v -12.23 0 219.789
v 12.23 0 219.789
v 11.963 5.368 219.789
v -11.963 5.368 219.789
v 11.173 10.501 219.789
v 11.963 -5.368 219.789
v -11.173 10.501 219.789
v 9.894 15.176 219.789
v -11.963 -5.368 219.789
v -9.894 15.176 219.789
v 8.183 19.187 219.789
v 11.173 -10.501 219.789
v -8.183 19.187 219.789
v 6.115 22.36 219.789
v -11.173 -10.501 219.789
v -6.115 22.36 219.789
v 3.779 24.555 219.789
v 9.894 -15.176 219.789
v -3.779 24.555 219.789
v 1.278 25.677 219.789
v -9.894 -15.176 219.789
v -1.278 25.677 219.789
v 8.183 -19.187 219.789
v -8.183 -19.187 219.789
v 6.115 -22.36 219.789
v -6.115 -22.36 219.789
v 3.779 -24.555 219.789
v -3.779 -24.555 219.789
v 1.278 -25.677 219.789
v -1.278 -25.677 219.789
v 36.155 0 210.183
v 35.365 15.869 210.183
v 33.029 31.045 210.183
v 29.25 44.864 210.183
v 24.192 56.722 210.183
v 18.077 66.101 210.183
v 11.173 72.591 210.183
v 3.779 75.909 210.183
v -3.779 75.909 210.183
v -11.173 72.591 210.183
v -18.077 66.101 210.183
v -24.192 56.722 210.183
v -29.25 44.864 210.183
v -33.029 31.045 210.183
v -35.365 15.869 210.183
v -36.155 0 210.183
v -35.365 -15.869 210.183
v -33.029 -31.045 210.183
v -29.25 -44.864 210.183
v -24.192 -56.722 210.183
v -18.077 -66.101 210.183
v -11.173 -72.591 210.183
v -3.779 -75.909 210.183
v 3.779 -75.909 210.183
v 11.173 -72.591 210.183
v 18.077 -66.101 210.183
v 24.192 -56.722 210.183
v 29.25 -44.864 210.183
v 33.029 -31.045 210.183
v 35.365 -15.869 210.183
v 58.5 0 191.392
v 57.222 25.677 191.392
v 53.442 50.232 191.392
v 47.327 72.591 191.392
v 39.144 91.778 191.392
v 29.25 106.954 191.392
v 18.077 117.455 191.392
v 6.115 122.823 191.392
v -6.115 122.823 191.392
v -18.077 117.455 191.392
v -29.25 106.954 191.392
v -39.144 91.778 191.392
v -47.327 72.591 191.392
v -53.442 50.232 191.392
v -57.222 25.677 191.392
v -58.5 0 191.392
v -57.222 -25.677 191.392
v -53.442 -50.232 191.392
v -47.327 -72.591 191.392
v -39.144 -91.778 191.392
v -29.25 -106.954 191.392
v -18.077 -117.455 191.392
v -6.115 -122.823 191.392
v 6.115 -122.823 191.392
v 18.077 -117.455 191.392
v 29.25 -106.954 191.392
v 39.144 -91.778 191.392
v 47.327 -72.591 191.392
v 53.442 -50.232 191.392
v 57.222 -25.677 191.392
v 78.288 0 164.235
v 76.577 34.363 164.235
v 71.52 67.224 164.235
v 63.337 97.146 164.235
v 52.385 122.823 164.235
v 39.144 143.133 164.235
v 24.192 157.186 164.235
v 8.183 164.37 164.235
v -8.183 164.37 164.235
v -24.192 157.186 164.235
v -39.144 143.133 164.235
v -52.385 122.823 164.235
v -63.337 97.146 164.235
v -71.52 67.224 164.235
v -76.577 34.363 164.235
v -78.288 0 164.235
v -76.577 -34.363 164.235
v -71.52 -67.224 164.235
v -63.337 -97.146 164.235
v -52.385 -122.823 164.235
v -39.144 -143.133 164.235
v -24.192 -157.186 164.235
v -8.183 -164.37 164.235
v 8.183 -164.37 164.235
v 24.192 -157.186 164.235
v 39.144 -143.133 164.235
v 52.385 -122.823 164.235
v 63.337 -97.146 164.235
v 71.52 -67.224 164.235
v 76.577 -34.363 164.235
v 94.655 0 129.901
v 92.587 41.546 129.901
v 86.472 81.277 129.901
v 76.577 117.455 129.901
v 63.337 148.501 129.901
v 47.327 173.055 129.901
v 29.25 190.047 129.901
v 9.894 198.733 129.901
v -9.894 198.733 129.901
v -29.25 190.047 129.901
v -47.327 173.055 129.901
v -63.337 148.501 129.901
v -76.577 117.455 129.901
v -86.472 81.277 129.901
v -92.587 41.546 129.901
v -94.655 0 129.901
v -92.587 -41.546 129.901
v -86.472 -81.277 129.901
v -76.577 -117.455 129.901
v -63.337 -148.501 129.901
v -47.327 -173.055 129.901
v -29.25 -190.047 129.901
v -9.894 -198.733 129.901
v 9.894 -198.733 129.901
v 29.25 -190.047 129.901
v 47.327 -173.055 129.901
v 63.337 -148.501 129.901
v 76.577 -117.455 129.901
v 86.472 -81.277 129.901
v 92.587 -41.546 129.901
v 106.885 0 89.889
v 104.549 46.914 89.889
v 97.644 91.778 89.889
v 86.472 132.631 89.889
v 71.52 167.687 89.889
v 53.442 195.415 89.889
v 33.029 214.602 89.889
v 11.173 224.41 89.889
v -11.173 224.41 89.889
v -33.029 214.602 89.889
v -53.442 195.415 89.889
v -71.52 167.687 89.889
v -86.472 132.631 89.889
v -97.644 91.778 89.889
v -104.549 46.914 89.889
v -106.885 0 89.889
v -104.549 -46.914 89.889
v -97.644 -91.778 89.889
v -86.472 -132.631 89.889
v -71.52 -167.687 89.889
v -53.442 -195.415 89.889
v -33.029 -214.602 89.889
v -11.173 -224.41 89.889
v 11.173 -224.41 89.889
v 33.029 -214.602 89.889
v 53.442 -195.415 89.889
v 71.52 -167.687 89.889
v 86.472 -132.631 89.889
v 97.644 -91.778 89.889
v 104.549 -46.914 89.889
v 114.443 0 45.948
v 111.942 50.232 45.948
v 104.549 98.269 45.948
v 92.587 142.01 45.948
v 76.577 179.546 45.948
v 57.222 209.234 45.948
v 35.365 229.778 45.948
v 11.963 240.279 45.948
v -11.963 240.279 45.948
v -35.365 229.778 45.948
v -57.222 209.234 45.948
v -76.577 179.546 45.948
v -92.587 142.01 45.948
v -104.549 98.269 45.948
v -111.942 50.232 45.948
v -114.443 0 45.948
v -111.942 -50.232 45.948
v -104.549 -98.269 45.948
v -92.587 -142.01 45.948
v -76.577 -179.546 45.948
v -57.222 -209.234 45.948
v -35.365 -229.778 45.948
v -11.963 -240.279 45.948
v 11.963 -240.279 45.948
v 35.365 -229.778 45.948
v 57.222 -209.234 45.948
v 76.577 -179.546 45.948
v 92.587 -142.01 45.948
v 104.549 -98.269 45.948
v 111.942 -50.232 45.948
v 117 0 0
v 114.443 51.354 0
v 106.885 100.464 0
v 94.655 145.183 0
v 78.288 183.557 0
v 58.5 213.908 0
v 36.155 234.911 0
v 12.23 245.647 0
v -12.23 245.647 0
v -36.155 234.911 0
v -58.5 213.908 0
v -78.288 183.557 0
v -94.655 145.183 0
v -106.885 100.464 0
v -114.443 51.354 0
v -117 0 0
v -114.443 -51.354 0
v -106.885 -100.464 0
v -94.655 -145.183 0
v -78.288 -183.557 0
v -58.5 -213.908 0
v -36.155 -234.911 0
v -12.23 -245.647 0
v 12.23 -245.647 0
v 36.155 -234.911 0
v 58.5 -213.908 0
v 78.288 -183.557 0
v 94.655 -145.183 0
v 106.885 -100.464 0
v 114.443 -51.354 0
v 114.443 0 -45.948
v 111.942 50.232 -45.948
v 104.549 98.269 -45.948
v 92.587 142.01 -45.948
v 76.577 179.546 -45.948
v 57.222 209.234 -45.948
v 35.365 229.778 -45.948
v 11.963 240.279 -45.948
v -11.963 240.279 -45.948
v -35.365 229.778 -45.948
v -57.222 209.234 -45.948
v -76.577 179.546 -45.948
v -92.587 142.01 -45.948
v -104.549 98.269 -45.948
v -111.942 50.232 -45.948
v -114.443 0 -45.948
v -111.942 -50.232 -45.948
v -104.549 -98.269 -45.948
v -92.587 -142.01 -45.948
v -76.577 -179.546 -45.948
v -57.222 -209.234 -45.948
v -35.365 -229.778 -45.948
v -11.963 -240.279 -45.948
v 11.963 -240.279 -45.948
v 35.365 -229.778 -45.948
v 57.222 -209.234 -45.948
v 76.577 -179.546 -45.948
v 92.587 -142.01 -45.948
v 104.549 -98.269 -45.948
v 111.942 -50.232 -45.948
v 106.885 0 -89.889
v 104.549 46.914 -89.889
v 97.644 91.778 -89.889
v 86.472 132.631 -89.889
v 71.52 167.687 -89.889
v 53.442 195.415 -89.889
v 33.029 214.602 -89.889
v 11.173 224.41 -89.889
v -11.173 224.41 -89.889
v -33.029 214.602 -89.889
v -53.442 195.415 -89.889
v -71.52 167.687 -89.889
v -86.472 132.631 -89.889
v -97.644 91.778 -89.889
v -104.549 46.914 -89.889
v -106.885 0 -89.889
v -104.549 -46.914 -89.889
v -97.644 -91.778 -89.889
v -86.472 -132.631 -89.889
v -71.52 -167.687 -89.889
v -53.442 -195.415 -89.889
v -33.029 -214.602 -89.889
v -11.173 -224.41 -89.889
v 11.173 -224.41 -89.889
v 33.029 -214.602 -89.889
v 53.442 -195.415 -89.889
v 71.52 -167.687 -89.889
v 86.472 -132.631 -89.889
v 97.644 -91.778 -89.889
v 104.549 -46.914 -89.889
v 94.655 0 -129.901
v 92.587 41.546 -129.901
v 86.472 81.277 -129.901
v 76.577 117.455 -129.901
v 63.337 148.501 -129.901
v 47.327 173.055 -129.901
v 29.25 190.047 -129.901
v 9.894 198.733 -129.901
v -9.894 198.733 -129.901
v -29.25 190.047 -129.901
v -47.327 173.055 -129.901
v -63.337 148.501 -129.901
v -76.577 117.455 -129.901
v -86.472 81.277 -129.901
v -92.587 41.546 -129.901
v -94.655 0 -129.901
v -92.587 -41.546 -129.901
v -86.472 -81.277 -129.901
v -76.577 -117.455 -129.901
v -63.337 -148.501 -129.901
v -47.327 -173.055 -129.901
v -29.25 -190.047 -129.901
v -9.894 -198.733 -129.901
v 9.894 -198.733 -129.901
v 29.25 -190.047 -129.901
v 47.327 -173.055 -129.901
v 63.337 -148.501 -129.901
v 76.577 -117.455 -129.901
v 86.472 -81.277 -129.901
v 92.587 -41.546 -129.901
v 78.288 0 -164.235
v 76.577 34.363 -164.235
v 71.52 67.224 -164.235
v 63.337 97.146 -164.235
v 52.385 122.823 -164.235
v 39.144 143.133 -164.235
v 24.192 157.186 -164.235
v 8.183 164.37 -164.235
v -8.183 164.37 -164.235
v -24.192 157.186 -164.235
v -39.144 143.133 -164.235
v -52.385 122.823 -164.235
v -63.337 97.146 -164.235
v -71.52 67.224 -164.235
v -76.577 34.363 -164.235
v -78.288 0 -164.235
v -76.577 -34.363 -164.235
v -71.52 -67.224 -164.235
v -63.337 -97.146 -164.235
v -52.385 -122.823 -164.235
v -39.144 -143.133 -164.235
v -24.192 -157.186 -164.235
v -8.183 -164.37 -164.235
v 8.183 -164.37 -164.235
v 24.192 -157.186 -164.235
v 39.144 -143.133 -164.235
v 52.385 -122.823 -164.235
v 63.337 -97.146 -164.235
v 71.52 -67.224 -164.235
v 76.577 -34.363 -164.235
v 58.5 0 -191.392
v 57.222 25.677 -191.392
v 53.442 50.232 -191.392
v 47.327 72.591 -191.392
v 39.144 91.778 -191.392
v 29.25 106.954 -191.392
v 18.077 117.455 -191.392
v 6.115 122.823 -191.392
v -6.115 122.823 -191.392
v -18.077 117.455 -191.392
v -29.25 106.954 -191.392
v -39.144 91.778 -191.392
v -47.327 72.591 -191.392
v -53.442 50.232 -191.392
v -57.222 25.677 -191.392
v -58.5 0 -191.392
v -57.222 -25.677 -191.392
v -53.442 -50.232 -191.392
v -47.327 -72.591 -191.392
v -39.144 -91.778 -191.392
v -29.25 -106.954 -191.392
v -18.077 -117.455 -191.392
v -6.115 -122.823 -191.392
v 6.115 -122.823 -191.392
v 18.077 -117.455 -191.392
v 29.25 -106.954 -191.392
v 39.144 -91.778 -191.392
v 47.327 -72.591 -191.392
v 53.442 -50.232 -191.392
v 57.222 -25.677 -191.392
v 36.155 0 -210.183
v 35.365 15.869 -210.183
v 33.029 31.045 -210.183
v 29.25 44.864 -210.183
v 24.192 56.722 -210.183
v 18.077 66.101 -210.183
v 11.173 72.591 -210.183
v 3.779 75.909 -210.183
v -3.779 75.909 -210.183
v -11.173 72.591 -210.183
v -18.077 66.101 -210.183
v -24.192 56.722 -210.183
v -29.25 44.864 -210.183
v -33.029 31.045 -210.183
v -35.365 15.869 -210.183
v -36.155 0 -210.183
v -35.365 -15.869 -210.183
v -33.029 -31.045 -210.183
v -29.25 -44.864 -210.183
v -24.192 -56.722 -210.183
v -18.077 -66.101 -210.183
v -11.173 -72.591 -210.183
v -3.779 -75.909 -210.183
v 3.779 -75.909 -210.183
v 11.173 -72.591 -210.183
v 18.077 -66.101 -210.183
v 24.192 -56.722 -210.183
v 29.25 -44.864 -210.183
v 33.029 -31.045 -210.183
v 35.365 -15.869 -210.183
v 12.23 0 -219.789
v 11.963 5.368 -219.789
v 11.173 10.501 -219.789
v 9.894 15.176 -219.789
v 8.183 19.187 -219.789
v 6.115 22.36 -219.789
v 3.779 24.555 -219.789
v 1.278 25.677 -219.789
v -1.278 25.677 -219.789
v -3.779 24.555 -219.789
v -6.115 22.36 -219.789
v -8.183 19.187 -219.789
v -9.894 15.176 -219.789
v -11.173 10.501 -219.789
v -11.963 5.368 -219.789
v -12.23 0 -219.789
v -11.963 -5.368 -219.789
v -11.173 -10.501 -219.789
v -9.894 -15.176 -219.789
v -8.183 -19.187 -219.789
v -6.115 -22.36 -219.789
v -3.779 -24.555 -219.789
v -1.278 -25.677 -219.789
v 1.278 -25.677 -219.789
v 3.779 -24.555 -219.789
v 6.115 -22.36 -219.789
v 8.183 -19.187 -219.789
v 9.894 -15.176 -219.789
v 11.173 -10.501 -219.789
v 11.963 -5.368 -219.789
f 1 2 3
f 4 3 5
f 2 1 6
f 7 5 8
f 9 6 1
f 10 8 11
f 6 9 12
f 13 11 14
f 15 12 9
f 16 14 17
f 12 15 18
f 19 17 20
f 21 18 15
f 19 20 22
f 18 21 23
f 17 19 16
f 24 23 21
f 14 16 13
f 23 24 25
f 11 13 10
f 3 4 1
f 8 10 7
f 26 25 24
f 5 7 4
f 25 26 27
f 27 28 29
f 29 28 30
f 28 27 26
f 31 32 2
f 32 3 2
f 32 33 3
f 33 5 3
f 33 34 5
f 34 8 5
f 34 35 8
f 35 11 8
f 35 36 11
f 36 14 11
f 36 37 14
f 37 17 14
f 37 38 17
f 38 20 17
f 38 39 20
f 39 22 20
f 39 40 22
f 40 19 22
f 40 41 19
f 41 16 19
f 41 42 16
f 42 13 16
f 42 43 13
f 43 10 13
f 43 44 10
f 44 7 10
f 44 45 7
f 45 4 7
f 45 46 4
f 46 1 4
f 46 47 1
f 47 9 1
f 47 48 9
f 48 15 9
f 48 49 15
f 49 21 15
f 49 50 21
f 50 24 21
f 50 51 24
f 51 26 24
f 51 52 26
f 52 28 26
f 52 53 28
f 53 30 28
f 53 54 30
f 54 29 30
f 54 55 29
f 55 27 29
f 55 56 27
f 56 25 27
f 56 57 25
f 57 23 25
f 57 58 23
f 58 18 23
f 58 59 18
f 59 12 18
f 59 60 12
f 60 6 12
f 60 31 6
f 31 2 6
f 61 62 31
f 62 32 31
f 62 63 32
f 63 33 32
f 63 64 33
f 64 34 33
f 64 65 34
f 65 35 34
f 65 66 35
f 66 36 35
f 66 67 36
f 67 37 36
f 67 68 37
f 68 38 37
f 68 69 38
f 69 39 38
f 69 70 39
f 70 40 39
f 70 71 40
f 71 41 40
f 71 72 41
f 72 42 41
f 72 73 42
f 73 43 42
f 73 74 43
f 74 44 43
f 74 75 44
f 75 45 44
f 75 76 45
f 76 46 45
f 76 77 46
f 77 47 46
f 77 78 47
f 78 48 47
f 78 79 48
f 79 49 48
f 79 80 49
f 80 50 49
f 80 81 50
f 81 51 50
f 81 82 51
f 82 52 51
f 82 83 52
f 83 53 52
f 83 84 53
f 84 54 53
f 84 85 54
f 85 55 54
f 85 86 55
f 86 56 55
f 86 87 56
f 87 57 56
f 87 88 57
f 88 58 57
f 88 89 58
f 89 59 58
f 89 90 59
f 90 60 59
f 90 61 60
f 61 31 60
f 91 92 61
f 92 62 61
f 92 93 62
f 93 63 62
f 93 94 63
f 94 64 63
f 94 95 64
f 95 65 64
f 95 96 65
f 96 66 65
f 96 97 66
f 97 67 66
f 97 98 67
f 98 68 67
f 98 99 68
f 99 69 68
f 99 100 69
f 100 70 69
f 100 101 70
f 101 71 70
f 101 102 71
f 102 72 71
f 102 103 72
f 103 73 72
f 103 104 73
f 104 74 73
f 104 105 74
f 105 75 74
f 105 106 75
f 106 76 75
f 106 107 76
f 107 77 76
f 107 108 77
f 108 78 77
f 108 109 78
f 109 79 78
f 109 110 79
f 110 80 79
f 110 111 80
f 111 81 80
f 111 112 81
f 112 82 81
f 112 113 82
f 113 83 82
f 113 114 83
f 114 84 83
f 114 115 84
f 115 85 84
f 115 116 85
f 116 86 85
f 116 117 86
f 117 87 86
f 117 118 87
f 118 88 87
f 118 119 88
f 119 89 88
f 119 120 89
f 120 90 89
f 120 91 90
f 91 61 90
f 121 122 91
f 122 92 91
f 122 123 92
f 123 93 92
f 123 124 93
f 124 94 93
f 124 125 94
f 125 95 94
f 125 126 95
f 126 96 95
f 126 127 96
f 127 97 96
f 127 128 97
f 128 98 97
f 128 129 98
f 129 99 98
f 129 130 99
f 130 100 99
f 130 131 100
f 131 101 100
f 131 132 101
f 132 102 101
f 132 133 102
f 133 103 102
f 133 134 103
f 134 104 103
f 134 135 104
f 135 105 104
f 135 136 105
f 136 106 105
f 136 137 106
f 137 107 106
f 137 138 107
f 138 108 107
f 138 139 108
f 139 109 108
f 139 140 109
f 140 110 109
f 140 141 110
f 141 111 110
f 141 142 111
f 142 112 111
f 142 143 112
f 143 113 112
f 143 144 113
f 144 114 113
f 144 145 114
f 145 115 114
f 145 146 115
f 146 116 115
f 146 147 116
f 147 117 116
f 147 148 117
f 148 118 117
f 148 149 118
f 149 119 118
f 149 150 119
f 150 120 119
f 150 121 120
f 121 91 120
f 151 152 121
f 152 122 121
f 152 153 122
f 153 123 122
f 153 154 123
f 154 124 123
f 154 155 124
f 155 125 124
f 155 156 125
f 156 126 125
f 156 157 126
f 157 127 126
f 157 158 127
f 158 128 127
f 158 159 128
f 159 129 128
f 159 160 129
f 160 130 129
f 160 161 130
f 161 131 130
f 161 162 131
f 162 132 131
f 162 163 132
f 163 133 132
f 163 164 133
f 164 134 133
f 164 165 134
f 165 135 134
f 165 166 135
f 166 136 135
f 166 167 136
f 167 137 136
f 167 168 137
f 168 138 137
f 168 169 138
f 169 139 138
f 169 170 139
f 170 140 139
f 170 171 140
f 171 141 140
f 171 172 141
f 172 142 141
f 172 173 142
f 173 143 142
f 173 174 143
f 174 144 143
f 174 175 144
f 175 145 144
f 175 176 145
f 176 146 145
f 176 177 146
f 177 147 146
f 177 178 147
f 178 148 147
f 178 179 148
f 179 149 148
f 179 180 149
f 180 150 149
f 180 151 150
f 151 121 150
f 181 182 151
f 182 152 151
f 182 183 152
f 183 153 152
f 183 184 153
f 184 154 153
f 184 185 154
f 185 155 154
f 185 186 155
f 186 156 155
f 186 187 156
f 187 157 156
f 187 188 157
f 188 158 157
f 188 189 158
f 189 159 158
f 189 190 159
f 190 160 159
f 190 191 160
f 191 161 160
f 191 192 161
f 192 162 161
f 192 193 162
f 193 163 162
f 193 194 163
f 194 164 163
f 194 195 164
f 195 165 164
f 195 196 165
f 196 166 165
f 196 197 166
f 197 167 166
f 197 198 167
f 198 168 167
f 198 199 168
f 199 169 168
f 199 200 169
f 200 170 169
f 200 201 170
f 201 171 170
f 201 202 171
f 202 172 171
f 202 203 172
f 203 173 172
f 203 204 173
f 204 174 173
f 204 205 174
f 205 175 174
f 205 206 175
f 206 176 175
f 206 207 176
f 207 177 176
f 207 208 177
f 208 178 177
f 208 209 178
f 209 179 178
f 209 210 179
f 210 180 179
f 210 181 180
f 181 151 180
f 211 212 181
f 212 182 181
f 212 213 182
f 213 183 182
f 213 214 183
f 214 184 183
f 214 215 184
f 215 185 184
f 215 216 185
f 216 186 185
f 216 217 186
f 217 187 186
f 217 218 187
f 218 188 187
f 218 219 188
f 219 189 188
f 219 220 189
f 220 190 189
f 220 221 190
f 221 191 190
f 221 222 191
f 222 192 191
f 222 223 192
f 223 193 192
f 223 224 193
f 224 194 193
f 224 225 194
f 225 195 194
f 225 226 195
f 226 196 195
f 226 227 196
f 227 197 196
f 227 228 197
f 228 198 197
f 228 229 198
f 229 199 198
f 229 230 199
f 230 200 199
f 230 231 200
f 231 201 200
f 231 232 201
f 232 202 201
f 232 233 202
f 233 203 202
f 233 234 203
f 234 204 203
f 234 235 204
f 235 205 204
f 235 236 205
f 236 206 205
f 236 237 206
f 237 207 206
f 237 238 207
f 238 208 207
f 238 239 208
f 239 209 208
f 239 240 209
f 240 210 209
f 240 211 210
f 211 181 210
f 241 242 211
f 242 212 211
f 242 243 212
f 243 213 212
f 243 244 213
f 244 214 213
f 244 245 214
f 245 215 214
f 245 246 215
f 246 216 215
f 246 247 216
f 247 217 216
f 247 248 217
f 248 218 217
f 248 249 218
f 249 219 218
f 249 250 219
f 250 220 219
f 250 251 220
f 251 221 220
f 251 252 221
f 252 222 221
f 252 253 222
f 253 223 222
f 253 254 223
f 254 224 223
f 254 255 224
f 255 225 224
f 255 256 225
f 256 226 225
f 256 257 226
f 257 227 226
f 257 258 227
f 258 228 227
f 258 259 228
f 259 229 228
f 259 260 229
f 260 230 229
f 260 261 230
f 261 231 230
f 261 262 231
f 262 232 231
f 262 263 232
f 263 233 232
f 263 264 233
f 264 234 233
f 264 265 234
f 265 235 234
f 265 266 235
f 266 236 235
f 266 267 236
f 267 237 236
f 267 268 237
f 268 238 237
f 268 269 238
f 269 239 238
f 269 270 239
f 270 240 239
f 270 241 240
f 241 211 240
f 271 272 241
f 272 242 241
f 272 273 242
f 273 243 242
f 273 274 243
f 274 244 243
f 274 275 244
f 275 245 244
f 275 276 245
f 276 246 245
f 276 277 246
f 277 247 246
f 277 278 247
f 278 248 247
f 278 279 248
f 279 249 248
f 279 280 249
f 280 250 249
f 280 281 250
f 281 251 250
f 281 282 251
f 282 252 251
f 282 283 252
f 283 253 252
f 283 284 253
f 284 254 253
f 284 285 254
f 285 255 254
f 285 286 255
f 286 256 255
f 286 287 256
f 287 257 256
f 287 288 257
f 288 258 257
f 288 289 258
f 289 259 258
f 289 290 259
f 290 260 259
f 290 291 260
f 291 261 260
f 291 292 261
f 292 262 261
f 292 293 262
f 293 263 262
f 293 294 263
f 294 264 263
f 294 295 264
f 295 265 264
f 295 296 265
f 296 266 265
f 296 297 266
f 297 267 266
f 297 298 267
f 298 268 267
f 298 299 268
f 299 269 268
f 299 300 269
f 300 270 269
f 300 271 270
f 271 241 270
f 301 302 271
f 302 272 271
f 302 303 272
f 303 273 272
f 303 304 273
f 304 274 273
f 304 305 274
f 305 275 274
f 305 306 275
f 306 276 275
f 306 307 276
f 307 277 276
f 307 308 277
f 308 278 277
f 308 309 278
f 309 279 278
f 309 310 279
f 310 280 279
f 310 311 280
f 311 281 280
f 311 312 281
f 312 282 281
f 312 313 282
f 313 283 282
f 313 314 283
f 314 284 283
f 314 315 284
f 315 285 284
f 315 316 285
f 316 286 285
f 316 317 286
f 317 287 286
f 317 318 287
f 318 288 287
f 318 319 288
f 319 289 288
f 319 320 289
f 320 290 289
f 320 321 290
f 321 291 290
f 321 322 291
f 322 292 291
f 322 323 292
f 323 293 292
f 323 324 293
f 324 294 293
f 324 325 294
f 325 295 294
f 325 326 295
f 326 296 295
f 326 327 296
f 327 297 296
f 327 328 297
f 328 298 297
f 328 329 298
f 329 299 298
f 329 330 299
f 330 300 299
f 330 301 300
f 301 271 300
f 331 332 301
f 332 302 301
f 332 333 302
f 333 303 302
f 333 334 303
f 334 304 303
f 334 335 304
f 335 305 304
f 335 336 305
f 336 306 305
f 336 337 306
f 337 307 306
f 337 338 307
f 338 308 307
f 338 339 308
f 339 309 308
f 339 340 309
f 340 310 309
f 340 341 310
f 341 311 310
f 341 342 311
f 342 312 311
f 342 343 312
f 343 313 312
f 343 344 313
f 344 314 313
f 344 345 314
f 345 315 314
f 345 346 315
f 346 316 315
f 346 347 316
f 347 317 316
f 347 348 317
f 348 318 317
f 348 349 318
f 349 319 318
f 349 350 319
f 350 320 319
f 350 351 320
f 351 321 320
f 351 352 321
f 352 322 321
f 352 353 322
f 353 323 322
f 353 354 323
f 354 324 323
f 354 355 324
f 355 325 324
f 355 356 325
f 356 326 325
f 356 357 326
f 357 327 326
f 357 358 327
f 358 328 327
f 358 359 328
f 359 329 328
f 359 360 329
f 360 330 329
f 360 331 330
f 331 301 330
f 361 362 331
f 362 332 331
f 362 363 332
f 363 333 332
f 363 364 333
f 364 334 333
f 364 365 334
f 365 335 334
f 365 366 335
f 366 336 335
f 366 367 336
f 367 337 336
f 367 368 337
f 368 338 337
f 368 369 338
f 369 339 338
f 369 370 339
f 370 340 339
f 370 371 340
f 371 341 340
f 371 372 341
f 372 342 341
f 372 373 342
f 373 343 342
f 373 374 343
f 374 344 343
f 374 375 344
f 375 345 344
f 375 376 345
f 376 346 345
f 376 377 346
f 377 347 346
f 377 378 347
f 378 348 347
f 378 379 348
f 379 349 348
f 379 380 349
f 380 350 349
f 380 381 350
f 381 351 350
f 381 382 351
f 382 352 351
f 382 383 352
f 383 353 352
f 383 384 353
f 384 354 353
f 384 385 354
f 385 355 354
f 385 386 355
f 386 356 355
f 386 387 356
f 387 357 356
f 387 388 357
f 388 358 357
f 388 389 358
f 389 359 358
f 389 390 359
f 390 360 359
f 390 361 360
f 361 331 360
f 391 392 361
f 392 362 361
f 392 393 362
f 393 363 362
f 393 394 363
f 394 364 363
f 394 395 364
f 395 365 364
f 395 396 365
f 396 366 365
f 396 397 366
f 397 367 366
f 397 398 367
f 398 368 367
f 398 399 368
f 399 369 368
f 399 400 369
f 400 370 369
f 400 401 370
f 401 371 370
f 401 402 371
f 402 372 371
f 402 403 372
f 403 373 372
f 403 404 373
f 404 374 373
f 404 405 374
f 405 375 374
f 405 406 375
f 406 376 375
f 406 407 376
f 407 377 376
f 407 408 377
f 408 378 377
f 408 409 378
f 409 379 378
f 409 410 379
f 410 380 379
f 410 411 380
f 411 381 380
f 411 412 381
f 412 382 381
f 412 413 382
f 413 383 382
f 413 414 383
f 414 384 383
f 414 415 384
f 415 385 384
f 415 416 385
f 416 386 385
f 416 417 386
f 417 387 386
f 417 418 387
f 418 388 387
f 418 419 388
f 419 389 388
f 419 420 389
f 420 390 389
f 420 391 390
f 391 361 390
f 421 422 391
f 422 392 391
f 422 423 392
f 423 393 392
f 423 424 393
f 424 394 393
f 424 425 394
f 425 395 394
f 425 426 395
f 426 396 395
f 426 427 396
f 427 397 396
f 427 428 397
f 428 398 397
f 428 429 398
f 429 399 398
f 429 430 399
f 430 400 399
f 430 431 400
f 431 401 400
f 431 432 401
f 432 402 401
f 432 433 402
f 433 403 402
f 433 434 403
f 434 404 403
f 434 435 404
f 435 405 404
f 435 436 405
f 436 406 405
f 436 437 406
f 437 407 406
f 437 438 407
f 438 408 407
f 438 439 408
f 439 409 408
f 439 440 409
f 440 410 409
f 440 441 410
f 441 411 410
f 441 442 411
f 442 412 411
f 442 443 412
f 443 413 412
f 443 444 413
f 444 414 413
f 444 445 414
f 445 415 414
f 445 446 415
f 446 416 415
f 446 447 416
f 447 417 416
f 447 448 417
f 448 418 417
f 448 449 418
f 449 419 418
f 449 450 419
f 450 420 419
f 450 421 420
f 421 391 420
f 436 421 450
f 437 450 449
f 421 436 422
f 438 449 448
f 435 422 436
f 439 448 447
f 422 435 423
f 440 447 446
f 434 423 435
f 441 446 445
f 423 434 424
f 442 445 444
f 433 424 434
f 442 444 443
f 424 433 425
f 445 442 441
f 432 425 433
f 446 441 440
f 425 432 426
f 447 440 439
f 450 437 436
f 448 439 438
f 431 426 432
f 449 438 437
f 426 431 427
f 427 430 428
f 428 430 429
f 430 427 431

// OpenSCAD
// Generated by SolidPython 1.0.1 on 2020-07-29 00:46:49


scale(v = [9, 19, 17]) {
	sphere(r = 13);
}
/***********************************************
*********      SolidPython code:      **********
************************************************
 
# import packages: SolidPython
from solid import *
from solid.utils import *
from itertools import chain, combinations, permutations


class Resize:

    def __init__(self, scad_file):
        self.scad_file = scad_file
        #self.scad_file = import_scad(scad_file)
        # cone/cylinder param:
        self.r1 = 0
        self.r2 = 0
        self.h = 0
        # rectangular prism param:
        self.w = 0
        self.l = 0
        # ellipse param:
        self.r = 0

    # import OpenScad code (file name corresponds to shape)


    # classify shape + parameters
    def assign(self, param1, param2, param3):
        if self.scad_file == 'cone.scad':
            self.r1 = param1
            self.r2 = param2
            self.h = param3
        elif self.scad_file == 'cylinder.scad':
            self.r1 = param1
            self.r2 = param2
            self.h = param3
        elif self.scad_file == 'rectangularPrism.scad':
            self.h = param1
            self.l = param2
            self.w = param3
        else:
            self.r = param1
            self.h = param2

    # resize parameters
    def iterate(self):
        x = range(3, 20, 2)
        i = 1
        if self.scad_file == 'cone.scad':
            tempList = list(permutations(x, 2))
            for temp in tempList:
                param1 = temp[0]
                param2 = temp[1]
                filepath = 'produced_scad_files/' + 'cone' + str(param1) + '_' + str(param2) + '_' + '.scad'
                scad_render_to_file(cylinder(h=param1, r1=param2, r2=0), filepath)

        elif self.scad_file == 'cylinder.scad':
            tempList = list(permutations(x, 3))
            for temp in tempList:
                param1 = temp[0]
                param2 = temp[1]
                filepath = 'produced_scad_files/' + 'cylinder' + str(param1) + '_' + str(param2) + '_' + '.scad'
                scad_render_to_file(cylinder(h=param1, r1=param2, r2=param2), filepath)

        elif self.scad_file == 'rectangularPrism.scad':
            tempList = list(permutations(x, 3))
            for temp in tempList:
                param1 = temp[0]
                param2 = temp[1]
                param3 = temp[2]
                filepath = 'produced_scad_files/' + 'rectangularPrism' + str(param1) + '_' + str(param2) + '_' + str(
                    param3) + '.scad'
                scad_render_to_file(cube(size=(param1, param2, param3)), filepath)

        elif self.scad_file == 'ellipse.scad':
            tempList = list(permutations(x, 4))
            for temp in tempList:
                param1 = temp[0]
                param2 = temp[1]
                param3 = temp[2]
                param4 = temp[3]
                filepath = 'produced_scad_files/' + 'ellipse' + str(param1) + '_' + str(param2) + '_' + str(param3) + '_' + str(param4) + '.scad'
                scad_render_to_file(scale([param1, param2, param3])(sphere(r=param4)), filepath)

    def render_to_scadfile(self):
        scad_render_to_file(scad, 'example.scad') 
 
************************************************/
